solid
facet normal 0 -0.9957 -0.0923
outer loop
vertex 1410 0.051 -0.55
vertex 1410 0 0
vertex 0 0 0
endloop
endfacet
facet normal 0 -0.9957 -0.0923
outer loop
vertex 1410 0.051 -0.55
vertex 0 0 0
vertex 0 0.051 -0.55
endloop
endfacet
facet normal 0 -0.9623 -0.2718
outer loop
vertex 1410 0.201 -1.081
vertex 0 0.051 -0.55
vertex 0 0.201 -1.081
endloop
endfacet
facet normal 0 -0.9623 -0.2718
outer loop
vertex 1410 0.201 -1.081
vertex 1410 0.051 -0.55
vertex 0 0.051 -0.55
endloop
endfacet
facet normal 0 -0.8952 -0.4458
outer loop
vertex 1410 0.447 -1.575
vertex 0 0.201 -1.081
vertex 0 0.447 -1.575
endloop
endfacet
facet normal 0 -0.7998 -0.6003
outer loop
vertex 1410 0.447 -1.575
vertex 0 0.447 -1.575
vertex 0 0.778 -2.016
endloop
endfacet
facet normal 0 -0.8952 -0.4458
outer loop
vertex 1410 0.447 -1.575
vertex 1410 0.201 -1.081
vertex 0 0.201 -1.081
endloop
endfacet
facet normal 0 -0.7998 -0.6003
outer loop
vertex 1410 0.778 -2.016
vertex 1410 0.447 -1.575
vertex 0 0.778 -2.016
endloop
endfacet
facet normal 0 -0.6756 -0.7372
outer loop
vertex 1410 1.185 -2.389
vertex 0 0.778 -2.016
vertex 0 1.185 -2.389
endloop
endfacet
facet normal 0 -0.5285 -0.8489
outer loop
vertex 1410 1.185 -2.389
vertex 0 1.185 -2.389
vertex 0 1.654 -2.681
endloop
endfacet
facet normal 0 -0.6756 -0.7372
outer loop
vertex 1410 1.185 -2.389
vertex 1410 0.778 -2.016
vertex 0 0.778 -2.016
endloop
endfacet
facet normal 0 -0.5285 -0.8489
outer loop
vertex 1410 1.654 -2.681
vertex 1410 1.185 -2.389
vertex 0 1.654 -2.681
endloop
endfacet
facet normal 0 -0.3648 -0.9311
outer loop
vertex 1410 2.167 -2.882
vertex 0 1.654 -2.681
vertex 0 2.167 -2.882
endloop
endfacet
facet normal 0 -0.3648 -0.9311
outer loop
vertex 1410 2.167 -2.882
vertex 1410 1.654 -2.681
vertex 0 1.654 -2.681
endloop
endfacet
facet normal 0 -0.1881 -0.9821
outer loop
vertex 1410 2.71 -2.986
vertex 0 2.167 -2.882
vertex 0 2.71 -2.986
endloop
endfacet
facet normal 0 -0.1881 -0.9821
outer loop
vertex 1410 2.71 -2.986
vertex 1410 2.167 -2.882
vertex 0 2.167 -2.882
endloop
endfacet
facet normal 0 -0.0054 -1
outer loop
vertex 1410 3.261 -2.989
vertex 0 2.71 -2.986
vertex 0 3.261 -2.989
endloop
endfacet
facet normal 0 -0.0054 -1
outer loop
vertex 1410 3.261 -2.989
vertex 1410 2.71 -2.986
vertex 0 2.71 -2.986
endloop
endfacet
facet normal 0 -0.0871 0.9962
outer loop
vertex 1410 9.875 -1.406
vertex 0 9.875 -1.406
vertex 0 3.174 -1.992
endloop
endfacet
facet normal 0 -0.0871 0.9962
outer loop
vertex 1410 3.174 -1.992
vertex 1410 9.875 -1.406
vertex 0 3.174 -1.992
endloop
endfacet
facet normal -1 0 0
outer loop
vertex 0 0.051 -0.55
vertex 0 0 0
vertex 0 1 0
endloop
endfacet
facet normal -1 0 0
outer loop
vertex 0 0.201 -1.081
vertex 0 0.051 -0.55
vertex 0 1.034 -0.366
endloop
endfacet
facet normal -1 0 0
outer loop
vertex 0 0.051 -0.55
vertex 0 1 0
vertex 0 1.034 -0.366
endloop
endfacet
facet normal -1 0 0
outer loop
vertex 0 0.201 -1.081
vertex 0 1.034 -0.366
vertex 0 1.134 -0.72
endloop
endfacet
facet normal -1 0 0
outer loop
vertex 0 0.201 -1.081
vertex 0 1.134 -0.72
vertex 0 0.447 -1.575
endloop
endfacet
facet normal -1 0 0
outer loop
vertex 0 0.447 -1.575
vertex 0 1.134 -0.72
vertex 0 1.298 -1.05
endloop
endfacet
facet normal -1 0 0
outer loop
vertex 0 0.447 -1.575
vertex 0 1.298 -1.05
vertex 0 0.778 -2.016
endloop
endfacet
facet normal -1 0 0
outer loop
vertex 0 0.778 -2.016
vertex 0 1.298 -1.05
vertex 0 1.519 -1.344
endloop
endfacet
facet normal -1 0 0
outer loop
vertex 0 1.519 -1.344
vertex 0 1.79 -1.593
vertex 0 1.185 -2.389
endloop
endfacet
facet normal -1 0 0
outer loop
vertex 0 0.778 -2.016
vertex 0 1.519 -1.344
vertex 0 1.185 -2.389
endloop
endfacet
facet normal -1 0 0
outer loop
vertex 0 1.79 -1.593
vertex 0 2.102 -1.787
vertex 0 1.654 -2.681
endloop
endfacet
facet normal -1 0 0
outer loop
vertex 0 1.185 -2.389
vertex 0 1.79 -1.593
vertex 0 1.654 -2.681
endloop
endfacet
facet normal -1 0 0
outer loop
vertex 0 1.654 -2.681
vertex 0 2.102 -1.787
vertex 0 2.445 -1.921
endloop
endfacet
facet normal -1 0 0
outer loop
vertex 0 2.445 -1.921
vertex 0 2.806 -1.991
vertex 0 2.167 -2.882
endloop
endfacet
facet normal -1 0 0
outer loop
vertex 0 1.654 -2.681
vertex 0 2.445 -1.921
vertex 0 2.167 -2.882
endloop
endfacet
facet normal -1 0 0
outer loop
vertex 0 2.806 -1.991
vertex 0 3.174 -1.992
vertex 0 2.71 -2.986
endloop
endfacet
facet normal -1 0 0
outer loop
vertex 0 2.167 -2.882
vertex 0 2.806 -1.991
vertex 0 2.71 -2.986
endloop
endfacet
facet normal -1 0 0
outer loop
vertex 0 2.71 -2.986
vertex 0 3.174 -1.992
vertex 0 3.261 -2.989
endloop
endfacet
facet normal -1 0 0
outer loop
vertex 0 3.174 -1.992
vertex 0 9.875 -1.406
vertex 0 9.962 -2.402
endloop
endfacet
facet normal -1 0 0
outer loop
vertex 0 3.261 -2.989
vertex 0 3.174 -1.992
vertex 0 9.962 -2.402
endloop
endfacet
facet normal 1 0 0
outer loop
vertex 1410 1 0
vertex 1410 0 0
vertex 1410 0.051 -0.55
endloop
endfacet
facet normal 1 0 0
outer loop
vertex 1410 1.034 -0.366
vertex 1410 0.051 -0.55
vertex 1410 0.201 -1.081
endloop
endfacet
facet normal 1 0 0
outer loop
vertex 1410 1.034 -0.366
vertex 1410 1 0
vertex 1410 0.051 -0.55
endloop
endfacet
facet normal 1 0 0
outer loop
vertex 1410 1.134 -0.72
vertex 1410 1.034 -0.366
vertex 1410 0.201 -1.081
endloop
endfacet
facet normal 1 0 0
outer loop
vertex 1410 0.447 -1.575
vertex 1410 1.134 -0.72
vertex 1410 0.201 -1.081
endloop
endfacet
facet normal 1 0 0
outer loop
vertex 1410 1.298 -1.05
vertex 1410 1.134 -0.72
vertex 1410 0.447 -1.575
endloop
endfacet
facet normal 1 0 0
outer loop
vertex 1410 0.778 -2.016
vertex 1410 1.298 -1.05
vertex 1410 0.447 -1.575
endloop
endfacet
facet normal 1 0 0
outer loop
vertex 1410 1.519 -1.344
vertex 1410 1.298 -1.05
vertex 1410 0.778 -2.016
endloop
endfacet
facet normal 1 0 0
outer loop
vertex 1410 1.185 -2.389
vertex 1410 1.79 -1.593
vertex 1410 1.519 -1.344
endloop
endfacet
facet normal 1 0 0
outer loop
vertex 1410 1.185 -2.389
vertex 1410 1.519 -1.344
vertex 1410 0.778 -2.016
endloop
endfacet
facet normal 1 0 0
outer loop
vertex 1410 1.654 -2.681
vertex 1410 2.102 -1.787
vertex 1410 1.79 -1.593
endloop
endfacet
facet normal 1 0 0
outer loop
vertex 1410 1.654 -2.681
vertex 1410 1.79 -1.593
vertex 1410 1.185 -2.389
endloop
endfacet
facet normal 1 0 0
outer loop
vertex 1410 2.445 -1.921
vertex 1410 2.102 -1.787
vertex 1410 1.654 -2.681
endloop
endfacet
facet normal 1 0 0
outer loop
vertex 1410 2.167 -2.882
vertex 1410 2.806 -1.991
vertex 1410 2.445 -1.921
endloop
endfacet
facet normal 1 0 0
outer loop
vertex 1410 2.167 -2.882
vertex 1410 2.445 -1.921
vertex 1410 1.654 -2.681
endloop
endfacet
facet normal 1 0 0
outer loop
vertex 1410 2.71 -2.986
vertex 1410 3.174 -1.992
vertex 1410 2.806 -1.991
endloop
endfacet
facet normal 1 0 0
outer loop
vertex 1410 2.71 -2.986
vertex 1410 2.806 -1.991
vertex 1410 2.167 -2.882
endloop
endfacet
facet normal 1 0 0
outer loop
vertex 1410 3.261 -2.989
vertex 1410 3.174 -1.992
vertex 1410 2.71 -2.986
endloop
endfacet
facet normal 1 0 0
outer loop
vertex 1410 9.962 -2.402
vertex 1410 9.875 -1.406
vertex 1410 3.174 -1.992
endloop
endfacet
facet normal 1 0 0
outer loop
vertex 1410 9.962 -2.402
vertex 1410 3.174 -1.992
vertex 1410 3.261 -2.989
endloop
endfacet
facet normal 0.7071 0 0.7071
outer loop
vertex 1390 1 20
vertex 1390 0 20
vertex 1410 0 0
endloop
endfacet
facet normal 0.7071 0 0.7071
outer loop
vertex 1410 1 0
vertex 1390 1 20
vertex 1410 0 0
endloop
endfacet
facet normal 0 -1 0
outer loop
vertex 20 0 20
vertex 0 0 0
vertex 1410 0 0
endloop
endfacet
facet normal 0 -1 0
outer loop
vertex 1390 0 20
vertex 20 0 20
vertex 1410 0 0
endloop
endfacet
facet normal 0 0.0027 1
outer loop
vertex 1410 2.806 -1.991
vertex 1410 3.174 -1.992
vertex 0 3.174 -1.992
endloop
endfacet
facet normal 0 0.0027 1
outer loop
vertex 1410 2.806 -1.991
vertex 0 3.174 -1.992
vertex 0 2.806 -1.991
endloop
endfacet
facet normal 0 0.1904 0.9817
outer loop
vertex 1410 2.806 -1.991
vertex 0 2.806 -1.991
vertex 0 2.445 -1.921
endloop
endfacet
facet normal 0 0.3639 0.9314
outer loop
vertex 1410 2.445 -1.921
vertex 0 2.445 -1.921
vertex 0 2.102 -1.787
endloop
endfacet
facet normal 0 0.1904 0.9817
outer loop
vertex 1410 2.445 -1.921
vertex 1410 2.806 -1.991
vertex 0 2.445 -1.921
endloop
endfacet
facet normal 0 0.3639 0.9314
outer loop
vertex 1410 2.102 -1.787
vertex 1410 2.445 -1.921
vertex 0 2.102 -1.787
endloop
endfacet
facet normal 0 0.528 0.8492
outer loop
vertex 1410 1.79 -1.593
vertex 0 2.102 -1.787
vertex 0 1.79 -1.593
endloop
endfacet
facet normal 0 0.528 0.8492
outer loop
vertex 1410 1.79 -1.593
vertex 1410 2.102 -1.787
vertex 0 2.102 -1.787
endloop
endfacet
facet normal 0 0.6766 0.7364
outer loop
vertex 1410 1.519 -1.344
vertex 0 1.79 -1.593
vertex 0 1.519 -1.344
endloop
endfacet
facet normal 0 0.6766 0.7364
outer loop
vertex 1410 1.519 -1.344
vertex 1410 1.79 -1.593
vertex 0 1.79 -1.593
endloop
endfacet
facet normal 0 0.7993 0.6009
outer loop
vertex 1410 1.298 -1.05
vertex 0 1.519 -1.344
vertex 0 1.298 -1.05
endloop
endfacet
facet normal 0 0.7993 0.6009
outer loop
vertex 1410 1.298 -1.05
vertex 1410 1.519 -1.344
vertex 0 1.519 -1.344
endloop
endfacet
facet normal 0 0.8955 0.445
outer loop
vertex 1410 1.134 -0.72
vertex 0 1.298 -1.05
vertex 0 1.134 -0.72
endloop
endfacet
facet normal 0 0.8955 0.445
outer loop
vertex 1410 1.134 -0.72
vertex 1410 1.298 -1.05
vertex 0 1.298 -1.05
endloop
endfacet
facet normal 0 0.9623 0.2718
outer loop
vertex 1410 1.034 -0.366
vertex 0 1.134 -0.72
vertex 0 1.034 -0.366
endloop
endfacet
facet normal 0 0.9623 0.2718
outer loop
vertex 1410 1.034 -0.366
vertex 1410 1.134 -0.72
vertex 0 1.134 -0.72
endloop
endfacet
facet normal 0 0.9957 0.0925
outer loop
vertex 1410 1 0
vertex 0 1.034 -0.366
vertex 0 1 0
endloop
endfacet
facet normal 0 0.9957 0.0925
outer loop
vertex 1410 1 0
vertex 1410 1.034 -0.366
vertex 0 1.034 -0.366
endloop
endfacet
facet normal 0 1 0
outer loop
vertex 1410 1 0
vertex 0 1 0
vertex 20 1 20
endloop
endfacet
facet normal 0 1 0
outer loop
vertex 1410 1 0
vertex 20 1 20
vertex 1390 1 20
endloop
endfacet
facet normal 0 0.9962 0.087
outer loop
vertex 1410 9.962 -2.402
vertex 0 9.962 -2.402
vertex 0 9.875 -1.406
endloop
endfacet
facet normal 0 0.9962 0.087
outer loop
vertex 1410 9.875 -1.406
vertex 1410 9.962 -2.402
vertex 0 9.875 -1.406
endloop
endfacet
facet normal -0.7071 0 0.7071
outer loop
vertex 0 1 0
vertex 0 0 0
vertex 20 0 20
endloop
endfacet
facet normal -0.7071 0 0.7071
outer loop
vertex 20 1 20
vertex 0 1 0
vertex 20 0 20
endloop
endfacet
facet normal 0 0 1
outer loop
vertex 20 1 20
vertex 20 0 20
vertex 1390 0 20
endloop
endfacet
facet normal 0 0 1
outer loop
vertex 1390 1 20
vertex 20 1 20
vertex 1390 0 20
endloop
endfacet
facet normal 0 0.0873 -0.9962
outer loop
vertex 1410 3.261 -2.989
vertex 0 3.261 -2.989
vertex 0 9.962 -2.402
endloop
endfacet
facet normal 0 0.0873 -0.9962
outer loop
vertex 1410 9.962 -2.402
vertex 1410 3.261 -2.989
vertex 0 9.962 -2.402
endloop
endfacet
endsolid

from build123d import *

# Parameters (mm, degrees)
EXTRUDE_1_DEPTH        = 1
SM_EDGE_FLANGE_1_DEPTH = 1410


# Sheet-metal steps are written as plain solids
with BuildPart() as part:
    # Sketch 1 → Бобышка-Вытянуть1 (new body)
    with BuildSketch(Plane(origin=(0, 0, 0), x_dir=(1, 0, 0), z_dir=(0, 1, 0))):
        Polygon((0, 0), (20, -20), (1390, -20), (1410, 0), align=None)
    extrude(amount=EXTRUDE_1_DEPTH)

    # Ребро-кромка1 section (across the edge) → Ребро-кромка1 (add)
    with BuildSketch(Plane(origin=(1410, 1, -2.182617002), x_dir=(0, -0.08715574274765482, 0.9961946980917459), z_dir=(-1, 0, 0))):
        with BuildLine():
            Line((-1, 2.182617002), (-1, 8.908691499))
            Line((-1, 8.908691499), (0, 8.908691499))
            Line((0, 8.908691499), (0, 2.182617002))
            ThreePointArc((0, 2.182617002), (0.648819585, 0.708062329), (2.174311485, 0.190227606))
            Line((2.174311485, 0.190227606), (2.261467228, -0.805967092))
            ThreePointArc((2.261467228, -0.805967092), (-0.026770623, -0.029215008), (-1, 2.182617002))
        make_face()
    extrude(amount=SM_EDGE_FLANGE_1_DEPTH)


solid = part.part
